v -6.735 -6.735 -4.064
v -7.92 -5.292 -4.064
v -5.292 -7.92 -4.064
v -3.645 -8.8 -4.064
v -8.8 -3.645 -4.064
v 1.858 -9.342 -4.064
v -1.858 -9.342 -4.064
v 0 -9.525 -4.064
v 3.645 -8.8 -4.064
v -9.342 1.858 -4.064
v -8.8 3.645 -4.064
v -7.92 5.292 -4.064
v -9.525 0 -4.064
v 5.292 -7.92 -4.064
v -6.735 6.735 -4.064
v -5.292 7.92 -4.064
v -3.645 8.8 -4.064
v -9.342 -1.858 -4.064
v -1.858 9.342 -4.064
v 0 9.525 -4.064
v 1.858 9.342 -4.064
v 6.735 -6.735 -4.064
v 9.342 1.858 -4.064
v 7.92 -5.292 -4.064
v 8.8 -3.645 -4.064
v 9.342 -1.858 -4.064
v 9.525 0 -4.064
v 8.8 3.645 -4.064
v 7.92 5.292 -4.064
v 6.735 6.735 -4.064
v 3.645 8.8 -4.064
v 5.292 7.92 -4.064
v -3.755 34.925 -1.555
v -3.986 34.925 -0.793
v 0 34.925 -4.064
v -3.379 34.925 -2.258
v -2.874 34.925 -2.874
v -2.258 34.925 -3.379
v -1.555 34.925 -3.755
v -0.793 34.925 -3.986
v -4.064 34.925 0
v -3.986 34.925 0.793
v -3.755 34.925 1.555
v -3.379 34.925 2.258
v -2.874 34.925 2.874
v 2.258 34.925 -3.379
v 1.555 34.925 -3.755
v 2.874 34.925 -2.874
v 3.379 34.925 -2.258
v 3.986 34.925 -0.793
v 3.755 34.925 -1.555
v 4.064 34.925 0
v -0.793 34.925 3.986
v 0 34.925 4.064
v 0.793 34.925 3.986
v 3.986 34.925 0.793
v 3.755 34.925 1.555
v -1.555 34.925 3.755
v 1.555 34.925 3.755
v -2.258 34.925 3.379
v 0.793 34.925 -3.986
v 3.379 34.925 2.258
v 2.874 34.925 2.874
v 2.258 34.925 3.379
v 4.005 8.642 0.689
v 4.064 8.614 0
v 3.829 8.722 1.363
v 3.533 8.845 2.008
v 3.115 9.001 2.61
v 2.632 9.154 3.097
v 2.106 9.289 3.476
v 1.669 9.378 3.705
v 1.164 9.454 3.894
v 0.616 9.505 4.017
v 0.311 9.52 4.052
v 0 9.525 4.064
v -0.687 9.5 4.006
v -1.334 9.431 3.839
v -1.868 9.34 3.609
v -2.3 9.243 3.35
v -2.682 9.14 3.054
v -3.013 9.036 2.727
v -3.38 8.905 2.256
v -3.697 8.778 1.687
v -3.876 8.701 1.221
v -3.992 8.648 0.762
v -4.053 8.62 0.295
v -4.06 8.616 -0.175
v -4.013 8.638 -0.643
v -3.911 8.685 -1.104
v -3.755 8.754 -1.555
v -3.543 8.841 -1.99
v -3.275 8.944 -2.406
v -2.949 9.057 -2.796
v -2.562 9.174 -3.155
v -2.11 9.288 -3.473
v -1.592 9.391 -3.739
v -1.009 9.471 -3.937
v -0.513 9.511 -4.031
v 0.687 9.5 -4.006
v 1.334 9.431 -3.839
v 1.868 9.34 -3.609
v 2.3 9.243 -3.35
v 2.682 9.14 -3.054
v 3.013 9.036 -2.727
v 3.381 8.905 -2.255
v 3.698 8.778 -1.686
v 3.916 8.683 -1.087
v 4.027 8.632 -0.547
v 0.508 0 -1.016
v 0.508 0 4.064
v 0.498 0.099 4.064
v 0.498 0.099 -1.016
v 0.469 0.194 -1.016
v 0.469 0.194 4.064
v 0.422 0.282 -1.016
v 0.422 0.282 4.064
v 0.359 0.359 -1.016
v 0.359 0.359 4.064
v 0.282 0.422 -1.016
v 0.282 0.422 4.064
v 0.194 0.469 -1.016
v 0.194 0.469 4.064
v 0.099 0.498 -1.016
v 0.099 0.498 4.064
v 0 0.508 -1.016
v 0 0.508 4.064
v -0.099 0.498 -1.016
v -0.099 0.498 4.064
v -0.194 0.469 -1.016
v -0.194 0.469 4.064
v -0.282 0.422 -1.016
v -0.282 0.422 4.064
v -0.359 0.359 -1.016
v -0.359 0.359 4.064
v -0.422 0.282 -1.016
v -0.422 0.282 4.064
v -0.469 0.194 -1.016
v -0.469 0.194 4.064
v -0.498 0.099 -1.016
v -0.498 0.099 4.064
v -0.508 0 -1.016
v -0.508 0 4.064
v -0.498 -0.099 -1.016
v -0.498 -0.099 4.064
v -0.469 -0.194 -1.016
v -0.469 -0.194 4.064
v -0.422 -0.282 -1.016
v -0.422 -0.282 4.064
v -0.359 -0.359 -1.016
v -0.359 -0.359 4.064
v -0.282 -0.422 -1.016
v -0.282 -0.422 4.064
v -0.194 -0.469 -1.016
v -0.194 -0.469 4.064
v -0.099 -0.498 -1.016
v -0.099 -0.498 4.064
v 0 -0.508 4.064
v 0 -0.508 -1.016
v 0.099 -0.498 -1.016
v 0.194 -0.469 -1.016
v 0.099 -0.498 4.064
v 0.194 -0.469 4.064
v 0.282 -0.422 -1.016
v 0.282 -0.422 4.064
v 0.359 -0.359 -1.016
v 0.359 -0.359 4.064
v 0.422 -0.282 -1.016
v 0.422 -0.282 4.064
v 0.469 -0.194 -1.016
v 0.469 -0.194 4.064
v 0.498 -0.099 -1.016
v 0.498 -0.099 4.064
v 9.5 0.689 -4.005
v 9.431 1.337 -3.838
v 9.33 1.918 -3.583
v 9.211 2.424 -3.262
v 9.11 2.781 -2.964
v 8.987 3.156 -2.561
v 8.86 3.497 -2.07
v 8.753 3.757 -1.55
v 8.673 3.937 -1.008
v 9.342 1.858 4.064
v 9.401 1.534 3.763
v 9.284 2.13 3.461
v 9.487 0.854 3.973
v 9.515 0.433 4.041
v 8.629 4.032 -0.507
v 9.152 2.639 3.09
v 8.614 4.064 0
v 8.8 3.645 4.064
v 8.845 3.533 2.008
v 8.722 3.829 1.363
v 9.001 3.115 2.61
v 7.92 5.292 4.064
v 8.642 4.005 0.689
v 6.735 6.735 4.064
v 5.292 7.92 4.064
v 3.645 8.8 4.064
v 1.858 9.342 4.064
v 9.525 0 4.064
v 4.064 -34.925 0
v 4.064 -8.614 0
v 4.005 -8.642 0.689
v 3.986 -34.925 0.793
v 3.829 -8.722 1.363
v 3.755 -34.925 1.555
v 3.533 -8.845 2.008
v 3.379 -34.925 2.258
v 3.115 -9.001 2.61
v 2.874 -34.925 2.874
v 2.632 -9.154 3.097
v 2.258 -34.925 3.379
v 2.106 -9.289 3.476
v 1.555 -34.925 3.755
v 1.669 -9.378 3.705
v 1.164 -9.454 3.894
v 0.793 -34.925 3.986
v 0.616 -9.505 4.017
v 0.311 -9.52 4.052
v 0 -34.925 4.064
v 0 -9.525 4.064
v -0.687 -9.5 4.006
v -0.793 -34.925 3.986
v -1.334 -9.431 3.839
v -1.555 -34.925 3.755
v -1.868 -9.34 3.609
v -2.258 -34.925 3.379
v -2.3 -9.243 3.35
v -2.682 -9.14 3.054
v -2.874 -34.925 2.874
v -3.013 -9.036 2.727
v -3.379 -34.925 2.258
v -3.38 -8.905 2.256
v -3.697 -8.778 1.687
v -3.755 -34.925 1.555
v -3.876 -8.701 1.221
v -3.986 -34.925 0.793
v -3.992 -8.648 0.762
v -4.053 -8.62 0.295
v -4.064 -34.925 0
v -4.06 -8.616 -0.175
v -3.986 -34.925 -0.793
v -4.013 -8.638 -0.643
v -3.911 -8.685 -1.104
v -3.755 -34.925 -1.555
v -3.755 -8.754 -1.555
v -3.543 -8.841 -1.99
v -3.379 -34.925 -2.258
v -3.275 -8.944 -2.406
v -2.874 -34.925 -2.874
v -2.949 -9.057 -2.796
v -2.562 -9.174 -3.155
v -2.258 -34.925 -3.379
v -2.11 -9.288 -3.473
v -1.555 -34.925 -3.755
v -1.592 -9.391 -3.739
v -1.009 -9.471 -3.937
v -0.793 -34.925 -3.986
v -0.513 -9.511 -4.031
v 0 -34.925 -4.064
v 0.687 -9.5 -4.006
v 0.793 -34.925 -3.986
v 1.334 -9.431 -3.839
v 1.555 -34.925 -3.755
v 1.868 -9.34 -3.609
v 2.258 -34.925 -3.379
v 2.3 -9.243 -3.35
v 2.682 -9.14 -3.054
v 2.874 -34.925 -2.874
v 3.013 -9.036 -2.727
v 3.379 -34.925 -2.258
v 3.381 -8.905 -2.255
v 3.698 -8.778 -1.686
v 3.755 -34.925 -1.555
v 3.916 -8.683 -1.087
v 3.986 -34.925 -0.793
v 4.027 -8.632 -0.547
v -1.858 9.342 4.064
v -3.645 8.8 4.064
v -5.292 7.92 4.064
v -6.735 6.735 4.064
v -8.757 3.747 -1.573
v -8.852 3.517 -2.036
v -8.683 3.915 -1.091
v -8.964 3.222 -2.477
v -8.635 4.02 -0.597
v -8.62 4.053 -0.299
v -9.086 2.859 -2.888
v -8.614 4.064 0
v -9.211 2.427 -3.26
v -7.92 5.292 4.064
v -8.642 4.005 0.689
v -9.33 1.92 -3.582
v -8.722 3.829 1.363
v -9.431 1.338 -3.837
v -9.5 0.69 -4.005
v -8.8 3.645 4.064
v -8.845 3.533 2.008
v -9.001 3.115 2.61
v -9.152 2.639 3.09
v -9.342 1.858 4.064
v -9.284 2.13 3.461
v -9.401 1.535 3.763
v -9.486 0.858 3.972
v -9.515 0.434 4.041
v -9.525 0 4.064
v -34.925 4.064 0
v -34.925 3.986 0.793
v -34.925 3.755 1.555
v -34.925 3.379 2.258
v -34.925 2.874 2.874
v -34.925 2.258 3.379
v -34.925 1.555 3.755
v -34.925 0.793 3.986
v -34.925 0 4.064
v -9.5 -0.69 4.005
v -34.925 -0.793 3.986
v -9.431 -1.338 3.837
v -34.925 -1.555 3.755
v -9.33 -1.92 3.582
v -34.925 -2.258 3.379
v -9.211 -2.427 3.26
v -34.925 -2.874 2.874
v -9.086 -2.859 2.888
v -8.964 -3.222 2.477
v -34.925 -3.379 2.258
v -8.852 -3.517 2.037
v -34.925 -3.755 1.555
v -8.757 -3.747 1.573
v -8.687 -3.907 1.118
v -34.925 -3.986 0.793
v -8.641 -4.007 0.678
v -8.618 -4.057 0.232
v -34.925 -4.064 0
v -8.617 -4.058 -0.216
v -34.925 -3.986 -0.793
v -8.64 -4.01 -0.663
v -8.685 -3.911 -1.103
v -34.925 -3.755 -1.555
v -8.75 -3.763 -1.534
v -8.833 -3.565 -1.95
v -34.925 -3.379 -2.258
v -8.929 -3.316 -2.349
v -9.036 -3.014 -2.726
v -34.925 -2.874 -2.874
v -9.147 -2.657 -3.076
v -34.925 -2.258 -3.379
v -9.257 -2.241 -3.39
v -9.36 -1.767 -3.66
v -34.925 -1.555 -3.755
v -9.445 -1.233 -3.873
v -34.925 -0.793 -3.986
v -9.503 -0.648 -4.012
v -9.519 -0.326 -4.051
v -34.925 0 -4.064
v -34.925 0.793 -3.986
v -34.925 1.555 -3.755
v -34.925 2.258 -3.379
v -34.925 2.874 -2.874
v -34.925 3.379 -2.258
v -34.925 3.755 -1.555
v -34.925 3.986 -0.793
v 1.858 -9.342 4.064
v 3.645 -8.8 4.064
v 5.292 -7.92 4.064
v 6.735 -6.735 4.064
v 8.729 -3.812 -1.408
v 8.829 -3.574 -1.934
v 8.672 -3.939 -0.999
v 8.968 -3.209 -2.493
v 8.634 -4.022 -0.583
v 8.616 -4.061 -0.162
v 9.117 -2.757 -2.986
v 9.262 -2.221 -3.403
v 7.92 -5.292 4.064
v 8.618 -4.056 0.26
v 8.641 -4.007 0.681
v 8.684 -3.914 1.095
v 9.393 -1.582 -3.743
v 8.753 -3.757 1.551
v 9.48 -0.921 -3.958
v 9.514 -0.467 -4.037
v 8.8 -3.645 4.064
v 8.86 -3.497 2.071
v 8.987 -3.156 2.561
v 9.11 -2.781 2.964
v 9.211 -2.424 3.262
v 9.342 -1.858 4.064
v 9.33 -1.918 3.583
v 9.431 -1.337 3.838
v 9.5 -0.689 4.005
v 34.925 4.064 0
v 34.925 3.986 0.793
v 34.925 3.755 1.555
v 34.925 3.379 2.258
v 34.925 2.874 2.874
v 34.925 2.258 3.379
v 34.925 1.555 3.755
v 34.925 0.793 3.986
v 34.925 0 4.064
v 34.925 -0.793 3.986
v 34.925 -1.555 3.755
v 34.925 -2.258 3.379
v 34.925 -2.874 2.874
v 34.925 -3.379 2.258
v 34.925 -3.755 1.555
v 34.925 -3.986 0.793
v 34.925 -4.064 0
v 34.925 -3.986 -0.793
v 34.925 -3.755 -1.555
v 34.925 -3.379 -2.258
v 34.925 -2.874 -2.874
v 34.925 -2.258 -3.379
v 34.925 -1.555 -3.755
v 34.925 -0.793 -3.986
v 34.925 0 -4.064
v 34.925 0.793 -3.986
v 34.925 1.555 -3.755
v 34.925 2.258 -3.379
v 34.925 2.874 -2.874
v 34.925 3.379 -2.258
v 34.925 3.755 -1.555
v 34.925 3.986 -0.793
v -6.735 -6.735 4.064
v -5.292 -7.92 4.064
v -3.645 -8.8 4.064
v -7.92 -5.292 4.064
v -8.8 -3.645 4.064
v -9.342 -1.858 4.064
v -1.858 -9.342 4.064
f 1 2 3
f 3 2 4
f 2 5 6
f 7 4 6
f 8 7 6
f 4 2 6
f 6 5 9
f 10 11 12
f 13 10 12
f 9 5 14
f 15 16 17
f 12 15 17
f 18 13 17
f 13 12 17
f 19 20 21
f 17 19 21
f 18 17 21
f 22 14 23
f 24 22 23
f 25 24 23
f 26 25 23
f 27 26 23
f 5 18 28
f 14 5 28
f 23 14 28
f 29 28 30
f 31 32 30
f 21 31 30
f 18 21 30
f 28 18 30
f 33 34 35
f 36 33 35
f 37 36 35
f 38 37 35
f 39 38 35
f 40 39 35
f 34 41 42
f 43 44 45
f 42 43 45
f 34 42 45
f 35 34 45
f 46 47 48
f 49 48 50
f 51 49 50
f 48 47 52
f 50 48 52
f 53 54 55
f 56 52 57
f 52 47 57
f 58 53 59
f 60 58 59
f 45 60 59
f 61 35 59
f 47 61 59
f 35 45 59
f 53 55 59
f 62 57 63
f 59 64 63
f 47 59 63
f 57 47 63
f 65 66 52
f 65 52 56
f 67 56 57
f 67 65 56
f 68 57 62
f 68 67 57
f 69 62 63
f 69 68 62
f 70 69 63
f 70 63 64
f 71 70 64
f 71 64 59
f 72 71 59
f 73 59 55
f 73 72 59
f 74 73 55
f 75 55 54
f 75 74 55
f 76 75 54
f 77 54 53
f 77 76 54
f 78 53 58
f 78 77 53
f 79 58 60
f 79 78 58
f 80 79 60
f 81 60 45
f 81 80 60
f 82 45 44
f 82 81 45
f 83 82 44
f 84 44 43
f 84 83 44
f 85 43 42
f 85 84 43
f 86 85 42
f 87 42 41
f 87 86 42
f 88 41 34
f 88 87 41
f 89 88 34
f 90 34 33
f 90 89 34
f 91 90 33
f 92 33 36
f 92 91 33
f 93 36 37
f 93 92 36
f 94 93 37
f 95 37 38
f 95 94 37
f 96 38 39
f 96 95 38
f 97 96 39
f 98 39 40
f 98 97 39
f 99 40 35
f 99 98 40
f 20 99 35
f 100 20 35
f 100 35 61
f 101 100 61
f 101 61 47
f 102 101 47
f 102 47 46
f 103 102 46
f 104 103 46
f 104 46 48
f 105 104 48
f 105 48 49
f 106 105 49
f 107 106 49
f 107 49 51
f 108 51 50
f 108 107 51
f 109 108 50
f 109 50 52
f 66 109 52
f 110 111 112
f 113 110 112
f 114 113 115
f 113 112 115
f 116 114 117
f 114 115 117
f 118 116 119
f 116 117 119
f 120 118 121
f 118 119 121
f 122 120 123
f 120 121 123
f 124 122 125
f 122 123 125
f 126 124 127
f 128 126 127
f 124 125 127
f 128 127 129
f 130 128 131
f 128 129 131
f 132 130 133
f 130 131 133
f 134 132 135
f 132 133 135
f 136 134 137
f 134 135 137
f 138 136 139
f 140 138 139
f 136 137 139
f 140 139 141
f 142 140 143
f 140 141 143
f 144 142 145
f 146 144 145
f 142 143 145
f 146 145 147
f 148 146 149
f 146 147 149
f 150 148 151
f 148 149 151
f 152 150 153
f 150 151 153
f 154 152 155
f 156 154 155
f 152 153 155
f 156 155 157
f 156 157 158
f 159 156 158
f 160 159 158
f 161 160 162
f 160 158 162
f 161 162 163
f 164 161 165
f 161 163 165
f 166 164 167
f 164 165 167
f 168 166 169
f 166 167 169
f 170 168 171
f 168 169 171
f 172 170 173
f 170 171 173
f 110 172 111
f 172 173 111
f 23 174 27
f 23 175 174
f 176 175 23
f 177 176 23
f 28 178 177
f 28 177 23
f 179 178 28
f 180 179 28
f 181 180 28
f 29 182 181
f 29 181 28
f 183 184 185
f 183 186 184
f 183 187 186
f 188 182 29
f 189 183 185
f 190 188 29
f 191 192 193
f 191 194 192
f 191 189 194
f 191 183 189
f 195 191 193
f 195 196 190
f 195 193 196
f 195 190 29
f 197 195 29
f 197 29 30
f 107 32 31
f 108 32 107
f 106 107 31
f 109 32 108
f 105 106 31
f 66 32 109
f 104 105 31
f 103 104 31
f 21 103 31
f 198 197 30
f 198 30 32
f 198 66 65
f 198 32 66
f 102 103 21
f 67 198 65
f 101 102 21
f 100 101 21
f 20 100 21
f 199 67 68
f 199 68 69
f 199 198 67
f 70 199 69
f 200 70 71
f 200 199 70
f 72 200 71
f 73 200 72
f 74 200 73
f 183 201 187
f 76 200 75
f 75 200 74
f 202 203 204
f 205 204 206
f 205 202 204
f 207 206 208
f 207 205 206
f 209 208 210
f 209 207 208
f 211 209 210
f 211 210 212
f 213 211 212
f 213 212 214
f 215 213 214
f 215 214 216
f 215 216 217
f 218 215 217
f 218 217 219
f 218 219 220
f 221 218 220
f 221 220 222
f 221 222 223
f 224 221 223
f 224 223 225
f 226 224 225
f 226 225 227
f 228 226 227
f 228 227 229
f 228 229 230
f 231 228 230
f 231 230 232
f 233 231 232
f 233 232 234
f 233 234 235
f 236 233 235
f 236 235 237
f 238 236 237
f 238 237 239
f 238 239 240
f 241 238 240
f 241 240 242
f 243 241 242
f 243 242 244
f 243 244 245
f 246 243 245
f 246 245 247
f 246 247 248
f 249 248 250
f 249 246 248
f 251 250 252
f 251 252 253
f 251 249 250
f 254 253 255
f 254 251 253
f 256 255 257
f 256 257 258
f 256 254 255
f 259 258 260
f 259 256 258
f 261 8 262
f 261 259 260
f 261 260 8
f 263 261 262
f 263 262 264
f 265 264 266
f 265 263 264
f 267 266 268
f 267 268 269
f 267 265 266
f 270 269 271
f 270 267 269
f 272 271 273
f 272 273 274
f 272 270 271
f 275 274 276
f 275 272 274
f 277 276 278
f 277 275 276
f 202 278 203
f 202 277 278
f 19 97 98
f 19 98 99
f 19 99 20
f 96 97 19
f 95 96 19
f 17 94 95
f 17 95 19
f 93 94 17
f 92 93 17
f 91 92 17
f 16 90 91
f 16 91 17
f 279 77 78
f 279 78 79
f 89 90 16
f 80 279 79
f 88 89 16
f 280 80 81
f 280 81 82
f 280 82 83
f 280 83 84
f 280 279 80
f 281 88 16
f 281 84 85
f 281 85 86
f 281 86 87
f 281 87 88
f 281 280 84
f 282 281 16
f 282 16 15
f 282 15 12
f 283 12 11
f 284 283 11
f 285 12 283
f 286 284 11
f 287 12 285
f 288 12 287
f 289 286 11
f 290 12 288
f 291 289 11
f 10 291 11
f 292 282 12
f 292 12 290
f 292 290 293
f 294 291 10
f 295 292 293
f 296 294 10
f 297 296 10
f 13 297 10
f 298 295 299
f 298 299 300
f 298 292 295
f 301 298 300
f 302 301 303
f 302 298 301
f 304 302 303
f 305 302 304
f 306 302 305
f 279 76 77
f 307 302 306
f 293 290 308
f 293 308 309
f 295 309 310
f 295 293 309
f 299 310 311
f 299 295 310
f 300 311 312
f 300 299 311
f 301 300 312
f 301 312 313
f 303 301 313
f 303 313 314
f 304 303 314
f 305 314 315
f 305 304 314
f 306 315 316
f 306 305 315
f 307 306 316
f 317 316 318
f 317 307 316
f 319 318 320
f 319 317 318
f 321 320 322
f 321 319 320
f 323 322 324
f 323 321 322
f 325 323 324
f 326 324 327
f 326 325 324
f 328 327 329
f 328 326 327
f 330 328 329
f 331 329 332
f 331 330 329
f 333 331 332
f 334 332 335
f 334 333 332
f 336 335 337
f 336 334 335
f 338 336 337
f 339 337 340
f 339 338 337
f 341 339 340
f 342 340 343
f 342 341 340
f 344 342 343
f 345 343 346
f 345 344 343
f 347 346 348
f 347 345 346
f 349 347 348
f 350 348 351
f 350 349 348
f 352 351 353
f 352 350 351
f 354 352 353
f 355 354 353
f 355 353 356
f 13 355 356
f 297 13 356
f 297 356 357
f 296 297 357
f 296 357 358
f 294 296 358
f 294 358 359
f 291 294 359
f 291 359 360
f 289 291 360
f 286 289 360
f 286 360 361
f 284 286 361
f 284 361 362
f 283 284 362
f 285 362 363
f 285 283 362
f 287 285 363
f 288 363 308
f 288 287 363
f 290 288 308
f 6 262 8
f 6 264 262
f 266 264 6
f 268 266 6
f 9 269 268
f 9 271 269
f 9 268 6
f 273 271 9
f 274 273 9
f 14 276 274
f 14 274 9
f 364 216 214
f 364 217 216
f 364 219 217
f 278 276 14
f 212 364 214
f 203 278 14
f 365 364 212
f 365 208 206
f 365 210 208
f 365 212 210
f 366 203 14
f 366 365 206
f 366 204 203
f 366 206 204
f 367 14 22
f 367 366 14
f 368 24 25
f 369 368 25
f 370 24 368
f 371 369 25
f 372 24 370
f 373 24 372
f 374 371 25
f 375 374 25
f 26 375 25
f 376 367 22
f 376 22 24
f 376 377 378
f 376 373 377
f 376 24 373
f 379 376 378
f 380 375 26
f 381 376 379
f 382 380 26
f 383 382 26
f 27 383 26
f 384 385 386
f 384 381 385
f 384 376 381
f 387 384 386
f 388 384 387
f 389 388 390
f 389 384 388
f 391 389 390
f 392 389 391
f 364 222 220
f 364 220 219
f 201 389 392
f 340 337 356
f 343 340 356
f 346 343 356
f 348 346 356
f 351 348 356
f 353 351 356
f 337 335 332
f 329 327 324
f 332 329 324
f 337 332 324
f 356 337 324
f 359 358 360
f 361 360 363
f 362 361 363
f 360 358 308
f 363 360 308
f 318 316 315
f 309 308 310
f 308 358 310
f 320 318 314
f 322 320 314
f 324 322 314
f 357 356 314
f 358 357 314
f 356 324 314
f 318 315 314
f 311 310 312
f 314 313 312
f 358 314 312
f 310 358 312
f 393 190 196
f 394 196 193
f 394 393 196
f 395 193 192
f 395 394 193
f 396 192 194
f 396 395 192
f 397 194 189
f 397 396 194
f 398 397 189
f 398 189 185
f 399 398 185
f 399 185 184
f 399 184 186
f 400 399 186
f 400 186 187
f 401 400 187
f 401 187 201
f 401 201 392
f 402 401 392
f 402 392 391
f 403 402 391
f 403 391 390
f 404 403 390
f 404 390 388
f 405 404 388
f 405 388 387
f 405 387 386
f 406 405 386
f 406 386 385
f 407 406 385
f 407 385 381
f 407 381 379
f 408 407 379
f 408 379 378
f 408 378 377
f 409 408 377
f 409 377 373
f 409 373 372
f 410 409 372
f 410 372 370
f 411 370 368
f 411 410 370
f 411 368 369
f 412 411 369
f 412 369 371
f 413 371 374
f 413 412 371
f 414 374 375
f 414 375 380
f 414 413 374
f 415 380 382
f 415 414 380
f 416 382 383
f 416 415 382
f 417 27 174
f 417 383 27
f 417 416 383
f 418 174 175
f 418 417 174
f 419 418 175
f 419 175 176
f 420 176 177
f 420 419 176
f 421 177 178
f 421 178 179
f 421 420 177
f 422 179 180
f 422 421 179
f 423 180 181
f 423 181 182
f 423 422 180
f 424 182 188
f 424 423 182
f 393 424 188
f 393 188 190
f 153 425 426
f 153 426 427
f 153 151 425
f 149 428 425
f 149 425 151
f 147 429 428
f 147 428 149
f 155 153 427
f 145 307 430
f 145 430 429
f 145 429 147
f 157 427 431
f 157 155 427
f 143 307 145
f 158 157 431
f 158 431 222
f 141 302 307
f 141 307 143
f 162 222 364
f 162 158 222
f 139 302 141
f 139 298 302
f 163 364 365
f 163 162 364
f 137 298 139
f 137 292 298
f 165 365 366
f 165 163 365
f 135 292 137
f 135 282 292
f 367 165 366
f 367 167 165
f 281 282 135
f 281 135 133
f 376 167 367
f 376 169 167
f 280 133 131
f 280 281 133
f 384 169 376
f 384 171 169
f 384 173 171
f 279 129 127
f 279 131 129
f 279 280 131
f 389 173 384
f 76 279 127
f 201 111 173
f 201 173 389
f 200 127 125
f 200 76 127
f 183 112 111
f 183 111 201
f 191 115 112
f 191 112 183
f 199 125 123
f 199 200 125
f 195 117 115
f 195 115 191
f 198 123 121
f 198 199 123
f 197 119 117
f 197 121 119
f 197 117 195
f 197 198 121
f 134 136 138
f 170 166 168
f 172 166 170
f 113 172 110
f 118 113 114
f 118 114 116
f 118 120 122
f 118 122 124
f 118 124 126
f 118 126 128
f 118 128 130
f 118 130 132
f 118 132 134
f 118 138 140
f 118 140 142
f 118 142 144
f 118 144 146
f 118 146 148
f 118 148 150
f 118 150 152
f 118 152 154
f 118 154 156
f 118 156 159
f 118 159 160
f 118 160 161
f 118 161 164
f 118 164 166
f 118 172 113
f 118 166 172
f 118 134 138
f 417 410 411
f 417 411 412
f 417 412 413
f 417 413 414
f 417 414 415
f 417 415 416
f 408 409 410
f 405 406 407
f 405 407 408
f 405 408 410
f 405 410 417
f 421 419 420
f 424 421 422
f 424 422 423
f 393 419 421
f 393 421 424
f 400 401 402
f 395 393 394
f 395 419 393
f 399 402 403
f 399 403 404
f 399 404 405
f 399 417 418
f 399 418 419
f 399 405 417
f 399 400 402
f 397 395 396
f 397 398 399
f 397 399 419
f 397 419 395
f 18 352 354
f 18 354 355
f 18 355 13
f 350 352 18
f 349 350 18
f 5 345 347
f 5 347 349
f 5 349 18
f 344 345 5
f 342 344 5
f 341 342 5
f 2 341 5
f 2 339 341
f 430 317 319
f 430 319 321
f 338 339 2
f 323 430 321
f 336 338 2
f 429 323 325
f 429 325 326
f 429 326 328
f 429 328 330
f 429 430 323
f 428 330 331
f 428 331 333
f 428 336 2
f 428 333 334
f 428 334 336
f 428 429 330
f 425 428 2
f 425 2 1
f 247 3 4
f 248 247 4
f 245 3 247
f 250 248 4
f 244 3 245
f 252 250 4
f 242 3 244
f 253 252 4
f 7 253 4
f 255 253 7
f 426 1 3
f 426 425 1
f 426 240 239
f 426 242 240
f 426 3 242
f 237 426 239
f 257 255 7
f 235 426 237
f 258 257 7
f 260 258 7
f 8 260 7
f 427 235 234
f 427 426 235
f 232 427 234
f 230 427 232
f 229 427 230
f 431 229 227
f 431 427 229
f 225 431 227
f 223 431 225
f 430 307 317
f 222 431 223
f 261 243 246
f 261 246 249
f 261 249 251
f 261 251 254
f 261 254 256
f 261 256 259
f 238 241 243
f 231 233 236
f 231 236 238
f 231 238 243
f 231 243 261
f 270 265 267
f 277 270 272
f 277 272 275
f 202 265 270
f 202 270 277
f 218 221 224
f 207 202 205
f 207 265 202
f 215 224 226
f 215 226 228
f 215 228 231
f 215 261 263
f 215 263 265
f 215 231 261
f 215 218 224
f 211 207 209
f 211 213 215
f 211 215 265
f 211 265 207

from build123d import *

# Parameters (mm, degrees)
F0_R     = 9.525
F1_DEPTH = 4.064
F2_R     = 4.064
F3_DEPTH = 34.925
F4_R     = 4.064
F5_DEPTH = 34.925
F6_R     = 0.508
F7_DEPTH = 5.08


with BuildPart() as f1:
    # F0 (on Top) → F1 (new body, symmetric)
    with BuildSketch(Plane.XY):
        Circle(F0_R)
    extrude(amount=F1_DEPTH, both=True)

    # F2 (on Right) → F3 (join, symmetric)
    with BuildSketch(Plane.YZ):
        Circle(F2_R)
    extrude(amount=F3_DEPTH, both=True)

    # F4 (on Front) → F5 (join, symmetric)
    with BuildSketch(Plane.XZ):
        Circle(F4_R)
    extrude(amount=F5_DEPTH, both=True)

    # F6 (on face) → F7 (cut)
    with BuildSketch(Plane.XY.offset(4.064)):
        Circle(F6_R)
    extrude(amount=-F7_DEPTH, mode=Mode.SUBTRACT)


solid = f1.part
